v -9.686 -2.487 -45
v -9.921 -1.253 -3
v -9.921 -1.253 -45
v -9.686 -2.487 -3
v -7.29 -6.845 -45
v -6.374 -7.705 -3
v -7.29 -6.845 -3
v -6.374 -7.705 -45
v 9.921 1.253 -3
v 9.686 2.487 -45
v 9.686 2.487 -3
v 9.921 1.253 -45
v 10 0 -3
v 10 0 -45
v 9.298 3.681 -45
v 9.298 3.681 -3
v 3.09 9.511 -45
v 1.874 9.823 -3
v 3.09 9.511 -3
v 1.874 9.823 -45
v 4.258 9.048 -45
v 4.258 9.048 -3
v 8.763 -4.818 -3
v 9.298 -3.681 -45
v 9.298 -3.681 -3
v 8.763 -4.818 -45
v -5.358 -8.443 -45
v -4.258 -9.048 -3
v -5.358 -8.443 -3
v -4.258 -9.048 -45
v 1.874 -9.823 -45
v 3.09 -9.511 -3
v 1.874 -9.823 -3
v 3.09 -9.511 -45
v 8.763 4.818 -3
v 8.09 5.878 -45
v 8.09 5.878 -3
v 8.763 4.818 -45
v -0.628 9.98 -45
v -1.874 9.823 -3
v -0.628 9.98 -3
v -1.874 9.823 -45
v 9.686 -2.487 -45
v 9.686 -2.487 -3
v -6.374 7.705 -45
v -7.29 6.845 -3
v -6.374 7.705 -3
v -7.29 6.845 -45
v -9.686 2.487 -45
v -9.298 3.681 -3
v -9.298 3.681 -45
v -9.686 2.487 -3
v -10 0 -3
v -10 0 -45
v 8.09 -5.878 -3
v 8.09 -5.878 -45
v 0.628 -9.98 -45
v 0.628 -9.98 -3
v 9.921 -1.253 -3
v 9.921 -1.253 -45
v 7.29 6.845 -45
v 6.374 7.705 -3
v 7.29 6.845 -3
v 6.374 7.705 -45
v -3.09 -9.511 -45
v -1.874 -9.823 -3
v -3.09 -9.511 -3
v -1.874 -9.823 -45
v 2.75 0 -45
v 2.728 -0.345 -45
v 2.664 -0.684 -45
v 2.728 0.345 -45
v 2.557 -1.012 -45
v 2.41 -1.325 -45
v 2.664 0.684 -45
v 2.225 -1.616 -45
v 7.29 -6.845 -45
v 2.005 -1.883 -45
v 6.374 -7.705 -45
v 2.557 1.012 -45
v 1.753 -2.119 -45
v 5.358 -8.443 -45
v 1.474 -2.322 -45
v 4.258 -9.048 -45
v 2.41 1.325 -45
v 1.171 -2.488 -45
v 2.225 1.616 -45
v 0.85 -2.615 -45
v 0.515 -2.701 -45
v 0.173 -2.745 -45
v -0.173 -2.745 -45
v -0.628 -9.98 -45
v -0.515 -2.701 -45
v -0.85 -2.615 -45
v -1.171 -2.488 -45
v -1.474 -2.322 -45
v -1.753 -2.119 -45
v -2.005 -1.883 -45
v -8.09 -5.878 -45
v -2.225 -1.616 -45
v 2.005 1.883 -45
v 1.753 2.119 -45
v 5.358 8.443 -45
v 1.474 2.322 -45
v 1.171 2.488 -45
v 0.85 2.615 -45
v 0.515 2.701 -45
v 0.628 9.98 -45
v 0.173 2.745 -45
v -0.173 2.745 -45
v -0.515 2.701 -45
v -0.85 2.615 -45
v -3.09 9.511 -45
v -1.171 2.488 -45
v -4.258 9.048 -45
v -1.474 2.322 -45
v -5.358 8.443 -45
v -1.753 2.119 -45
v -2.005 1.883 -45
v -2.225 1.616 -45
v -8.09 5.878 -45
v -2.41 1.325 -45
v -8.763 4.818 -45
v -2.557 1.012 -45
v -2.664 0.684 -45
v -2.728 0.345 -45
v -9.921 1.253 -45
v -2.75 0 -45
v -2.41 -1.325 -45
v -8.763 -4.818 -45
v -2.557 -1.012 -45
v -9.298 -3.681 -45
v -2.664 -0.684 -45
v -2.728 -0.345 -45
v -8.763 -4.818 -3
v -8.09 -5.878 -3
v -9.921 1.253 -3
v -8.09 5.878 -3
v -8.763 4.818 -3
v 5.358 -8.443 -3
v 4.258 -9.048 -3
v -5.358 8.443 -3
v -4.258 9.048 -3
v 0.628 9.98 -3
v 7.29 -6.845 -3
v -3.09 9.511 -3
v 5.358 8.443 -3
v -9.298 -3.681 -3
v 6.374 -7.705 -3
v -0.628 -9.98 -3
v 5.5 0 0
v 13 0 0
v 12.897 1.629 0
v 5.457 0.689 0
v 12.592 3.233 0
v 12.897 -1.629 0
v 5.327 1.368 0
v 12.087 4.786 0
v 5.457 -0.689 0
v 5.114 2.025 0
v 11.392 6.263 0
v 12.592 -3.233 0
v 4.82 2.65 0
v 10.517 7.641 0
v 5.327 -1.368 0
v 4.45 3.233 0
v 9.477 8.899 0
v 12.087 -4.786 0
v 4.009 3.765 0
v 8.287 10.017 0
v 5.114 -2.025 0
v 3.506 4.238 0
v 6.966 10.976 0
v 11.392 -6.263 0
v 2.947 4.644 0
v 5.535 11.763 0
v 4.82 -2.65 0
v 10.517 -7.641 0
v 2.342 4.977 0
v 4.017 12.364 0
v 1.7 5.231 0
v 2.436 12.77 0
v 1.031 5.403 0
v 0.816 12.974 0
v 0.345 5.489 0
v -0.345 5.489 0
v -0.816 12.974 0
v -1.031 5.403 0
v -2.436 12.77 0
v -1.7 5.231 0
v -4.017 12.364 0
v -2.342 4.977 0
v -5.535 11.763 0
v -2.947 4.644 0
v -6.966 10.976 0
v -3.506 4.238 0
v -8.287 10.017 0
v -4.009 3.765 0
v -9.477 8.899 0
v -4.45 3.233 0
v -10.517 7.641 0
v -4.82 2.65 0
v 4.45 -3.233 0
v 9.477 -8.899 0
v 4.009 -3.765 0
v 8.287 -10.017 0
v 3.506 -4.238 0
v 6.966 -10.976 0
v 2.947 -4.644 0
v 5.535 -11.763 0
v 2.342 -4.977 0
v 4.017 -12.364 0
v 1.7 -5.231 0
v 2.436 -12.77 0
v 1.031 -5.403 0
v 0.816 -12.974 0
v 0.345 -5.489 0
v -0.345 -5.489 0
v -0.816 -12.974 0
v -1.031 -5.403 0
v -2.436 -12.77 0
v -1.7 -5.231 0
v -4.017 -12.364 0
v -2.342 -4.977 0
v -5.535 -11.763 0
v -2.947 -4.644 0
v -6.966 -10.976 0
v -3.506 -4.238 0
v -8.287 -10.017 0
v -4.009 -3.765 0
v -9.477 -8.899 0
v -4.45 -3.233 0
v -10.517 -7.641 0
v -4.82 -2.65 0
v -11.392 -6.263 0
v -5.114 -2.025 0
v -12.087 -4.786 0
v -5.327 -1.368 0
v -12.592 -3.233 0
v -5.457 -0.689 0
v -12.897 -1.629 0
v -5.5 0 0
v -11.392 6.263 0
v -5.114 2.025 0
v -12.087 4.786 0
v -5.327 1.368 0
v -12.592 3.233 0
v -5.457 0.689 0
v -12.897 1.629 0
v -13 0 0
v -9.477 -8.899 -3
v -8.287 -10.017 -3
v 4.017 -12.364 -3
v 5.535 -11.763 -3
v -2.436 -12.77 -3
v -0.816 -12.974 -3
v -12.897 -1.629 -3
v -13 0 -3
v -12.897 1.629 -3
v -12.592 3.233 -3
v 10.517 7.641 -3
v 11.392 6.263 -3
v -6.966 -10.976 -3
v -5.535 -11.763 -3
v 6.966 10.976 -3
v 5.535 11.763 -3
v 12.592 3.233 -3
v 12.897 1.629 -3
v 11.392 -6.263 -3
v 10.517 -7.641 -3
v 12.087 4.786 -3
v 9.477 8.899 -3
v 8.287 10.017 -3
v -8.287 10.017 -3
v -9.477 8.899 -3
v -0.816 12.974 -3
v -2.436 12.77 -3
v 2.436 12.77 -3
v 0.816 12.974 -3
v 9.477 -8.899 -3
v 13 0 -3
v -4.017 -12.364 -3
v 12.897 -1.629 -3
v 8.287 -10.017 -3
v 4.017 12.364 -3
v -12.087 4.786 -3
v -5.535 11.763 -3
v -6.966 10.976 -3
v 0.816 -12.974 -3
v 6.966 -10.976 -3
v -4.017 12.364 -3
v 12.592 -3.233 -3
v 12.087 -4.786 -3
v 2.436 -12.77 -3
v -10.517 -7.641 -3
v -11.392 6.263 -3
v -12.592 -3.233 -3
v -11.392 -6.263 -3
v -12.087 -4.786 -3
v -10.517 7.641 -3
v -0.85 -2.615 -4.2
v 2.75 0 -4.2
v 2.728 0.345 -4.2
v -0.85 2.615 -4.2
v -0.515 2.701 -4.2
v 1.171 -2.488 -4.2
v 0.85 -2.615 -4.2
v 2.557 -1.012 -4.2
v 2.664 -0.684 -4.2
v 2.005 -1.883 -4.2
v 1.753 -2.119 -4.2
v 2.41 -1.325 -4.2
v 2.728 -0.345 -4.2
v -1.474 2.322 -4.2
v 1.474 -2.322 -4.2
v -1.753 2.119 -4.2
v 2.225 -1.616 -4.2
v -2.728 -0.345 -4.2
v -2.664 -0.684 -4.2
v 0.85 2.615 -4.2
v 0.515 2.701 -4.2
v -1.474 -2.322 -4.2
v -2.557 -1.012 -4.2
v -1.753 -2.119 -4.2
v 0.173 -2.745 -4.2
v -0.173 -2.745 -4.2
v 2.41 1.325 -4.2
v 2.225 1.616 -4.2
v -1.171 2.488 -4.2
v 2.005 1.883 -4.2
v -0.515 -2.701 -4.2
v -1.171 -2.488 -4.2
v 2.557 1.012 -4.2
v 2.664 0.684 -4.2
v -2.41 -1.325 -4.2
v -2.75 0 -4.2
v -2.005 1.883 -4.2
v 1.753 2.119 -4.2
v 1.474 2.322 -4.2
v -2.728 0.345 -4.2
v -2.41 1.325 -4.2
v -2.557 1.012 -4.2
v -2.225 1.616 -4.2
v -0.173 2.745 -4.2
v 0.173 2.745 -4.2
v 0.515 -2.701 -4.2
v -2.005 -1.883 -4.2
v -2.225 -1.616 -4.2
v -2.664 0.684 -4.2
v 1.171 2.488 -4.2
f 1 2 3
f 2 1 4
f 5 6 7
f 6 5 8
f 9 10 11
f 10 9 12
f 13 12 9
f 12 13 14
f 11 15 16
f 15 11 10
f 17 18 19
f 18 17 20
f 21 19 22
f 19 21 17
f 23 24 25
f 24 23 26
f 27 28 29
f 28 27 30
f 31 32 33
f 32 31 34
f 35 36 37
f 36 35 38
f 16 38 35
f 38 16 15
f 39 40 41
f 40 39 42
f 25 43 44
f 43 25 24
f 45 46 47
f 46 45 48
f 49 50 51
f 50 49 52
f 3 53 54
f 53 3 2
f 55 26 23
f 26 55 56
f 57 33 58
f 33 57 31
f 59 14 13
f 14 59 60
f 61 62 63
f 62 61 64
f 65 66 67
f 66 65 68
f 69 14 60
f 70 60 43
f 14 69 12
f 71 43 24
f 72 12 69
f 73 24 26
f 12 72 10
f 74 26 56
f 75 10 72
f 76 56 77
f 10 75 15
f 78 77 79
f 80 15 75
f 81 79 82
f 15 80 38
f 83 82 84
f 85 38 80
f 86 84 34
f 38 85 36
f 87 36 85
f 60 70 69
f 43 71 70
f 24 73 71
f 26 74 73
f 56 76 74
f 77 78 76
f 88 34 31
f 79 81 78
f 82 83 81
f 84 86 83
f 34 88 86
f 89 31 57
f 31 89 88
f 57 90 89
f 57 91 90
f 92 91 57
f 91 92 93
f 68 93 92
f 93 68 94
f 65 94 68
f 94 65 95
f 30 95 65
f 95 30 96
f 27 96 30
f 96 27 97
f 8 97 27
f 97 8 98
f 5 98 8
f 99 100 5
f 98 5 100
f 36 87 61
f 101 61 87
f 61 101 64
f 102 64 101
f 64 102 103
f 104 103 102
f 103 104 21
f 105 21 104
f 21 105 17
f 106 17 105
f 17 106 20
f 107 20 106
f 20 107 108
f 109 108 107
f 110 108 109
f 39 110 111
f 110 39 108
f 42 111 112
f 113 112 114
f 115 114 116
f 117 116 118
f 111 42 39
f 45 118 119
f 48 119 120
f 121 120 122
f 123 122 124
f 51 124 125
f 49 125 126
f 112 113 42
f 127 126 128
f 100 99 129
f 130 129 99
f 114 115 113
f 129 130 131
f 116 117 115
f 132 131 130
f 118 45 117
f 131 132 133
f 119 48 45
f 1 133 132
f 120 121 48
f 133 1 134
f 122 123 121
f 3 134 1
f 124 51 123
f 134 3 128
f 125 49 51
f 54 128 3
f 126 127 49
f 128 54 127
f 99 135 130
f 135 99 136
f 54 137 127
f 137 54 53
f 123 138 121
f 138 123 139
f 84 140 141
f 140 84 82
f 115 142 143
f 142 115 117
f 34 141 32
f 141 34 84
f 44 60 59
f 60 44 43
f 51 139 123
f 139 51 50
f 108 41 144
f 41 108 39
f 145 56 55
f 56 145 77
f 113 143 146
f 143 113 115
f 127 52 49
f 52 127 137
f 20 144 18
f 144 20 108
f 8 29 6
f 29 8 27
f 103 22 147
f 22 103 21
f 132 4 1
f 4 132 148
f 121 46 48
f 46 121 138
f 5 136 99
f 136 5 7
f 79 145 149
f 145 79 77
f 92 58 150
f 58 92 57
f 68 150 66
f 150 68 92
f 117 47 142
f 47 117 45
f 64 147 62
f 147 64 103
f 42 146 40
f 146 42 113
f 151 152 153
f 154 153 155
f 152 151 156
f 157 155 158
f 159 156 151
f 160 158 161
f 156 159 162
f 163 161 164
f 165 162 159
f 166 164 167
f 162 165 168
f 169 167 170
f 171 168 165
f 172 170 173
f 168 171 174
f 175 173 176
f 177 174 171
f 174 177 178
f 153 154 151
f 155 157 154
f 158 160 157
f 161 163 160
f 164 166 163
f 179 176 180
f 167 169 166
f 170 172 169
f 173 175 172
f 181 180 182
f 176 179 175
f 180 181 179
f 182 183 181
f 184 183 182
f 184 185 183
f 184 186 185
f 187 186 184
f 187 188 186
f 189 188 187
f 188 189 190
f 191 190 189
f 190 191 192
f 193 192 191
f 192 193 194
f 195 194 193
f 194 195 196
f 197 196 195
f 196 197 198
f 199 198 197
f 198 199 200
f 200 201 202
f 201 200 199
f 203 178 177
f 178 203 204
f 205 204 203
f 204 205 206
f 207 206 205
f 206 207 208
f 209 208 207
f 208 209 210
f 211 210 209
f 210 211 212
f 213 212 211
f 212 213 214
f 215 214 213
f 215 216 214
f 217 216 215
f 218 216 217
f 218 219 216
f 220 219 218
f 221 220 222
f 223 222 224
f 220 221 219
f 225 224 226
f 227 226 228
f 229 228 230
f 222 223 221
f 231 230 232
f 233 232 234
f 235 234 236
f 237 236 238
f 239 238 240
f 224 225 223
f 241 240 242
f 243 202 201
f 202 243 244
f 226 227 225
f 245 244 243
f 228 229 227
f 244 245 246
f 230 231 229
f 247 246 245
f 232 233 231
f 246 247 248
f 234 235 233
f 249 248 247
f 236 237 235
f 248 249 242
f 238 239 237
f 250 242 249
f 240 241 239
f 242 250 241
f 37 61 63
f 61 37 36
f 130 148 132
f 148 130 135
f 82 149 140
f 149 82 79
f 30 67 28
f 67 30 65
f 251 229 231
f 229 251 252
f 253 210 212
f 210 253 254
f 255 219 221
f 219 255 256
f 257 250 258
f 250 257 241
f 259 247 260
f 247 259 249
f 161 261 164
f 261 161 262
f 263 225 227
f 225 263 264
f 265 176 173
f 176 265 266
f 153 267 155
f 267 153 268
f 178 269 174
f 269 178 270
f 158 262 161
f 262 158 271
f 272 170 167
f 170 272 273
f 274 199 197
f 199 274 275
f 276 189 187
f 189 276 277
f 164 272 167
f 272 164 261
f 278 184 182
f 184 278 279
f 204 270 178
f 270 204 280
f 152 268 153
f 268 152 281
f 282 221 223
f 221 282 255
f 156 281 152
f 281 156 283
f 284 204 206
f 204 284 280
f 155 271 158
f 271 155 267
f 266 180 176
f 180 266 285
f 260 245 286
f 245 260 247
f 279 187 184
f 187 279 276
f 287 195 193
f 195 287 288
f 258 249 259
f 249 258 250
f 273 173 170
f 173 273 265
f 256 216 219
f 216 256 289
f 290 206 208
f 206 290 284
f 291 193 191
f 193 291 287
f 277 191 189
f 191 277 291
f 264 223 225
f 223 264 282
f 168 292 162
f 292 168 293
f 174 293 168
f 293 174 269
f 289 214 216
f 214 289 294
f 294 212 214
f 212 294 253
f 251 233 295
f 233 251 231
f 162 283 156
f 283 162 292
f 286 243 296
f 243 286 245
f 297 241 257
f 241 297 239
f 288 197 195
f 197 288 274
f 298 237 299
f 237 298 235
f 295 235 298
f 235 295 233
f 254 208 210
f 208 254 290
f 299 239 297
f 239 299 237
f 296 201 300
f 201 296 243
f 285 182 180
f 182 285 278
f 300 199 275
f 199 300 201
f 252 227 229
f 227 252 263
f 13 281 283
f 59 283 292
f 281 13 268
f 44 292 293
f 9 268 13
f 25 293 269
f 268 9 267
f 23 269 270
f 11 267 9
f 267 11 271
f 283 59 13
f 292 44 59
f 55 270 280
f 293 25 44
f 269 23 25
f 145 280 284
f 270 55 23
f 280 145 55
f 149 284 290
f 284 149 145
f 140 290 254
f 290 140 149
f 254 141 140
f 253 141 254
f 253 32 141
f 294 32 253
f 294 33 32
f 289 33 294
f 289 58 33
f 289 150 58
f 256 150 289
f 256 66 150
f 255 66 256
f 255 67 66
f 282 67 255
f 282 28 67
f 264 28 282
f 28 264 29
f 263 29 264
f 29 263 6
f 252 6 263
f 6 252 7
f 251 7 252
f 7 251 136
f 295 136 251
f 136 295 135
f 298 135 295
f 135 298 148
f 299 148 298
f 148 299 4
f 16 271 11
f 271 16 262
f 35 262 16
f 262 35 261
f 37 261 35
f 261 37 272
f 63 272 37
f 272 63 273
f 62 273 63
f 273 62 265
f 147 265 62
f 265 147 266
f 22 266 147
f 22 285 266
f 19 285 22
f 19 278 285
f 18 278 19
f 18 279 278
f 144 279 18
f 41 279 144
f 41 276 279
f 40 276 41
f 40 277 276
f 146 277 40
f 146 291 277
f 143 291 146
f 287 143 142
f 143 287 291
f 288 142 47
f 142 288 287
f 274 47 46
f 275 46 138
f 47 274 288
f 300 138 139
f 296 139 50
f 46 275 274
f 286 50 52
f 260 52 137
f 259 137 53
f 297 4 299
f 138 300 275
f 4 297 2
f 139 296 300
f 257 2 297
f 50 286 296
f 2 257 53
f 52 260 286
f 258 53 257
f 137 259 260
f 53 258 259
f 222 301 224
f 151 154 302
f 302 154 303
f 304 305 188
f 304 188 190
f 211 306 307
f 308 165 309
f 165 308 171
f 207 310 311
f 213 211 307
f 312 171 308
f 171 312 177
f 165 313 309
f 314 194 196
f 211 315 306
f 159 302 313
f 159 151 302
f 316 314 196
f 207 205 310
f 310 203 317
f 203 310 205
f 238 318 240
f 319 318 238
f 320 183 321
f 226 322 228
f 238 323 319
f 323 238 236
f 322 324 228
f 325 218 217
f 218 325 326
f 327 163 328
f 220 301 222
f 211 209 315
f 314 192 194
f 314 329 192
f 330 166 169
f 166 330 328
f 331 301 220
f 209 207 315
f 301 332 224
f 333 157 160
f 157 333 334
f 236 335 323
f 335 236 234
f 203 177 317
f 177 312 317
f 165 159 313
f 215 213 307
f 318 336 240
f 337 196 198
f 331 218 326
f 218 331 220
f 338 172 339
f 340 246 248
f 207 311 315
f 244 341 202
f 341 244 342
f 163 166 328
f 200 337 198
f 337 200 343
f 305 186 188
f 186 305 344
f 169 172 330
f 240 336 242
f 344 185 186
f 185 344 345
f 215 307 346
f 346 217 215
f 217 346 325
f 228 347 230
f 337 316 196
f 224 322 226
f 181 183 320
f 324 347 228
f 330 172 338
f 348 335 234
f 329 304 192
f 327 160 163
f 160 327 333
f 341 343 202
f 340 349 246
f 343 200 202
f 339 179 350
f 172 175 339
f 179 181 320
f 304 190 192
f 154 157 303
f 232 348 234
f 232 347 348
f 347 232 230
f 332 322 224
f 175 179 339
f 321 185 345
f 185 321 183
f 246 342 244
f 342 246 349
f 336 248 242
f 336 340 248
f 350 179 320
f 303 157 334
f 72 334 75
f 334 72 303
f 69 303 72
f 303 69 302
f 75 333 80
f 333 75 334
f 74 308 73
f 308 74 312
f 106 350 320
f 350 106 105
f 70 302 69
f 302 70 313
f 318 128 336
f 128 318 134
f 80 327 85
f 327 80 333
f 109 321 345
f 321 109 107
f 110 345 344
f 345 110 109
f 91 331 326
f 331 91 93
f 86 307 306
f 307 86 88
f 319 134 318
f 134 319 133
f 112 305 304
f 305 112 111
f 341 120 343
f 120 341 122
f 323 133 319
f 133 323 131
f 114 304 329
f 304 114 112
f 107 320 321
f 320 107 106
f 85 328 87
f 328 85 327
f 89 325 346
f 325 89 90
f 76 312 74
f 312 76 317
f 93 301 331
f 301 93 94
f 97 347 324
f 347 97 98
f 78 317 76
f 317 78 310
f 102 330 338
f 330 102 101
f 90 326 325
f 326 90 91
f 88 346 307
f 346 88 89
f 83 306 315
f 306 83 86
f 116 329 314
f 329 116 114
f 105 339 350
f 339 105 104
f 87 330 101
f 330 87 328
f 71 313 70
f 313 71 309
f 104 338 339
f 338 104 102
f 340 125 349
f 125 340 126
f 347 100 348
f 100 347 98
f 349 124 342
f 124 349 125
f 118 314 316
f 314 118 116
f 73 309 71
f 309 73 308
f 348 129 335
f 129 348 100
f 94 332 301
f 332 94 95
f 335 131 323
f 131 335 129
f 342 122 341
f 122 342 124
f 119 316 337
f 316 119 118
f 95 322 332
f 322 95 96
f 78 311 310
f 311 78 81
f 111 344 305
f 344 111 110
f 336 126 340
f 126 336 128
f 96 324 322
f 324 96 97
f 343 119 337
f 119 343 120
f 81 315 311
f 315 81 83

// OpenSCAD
$fn = 50;


difference() {
	union() {
		translate(v = [0, 0, -45.0000000000]) {
			cylinder(h = 45, r = 10.0000000000);
		}
		translate(v = [0, 0, -3.0000000000]) {
			cylinder(h = 3, r = 13.0000000000);
		}
	}
	union() {
		translate(v = [0, 0, 0]) {
			rotate(a = [0, 0, 0]) {
				difference() {
					union() {
						#translate(v = [0, 0, -45.0000000000]) {
							cylinder(h = 45, r = 2.2500000000);
						}
						#translate(v = [0, 0, -4.2000000000]) {
							cylinder(h = 4.2000000000, r1 = 2.7500000000, r2 = 5.5000000000);
						}
						#translate(v = [0, 0, -45.0000000000]) {
							cylinder(h = 45, r = 2.7500000000);
						}
						#translate(v = [0, 0, -45.0000000000]) {
							cylinder(h = 45, r = 2.2500000000);
						}
					}
					union();
				}
			}
		}
	}
}
